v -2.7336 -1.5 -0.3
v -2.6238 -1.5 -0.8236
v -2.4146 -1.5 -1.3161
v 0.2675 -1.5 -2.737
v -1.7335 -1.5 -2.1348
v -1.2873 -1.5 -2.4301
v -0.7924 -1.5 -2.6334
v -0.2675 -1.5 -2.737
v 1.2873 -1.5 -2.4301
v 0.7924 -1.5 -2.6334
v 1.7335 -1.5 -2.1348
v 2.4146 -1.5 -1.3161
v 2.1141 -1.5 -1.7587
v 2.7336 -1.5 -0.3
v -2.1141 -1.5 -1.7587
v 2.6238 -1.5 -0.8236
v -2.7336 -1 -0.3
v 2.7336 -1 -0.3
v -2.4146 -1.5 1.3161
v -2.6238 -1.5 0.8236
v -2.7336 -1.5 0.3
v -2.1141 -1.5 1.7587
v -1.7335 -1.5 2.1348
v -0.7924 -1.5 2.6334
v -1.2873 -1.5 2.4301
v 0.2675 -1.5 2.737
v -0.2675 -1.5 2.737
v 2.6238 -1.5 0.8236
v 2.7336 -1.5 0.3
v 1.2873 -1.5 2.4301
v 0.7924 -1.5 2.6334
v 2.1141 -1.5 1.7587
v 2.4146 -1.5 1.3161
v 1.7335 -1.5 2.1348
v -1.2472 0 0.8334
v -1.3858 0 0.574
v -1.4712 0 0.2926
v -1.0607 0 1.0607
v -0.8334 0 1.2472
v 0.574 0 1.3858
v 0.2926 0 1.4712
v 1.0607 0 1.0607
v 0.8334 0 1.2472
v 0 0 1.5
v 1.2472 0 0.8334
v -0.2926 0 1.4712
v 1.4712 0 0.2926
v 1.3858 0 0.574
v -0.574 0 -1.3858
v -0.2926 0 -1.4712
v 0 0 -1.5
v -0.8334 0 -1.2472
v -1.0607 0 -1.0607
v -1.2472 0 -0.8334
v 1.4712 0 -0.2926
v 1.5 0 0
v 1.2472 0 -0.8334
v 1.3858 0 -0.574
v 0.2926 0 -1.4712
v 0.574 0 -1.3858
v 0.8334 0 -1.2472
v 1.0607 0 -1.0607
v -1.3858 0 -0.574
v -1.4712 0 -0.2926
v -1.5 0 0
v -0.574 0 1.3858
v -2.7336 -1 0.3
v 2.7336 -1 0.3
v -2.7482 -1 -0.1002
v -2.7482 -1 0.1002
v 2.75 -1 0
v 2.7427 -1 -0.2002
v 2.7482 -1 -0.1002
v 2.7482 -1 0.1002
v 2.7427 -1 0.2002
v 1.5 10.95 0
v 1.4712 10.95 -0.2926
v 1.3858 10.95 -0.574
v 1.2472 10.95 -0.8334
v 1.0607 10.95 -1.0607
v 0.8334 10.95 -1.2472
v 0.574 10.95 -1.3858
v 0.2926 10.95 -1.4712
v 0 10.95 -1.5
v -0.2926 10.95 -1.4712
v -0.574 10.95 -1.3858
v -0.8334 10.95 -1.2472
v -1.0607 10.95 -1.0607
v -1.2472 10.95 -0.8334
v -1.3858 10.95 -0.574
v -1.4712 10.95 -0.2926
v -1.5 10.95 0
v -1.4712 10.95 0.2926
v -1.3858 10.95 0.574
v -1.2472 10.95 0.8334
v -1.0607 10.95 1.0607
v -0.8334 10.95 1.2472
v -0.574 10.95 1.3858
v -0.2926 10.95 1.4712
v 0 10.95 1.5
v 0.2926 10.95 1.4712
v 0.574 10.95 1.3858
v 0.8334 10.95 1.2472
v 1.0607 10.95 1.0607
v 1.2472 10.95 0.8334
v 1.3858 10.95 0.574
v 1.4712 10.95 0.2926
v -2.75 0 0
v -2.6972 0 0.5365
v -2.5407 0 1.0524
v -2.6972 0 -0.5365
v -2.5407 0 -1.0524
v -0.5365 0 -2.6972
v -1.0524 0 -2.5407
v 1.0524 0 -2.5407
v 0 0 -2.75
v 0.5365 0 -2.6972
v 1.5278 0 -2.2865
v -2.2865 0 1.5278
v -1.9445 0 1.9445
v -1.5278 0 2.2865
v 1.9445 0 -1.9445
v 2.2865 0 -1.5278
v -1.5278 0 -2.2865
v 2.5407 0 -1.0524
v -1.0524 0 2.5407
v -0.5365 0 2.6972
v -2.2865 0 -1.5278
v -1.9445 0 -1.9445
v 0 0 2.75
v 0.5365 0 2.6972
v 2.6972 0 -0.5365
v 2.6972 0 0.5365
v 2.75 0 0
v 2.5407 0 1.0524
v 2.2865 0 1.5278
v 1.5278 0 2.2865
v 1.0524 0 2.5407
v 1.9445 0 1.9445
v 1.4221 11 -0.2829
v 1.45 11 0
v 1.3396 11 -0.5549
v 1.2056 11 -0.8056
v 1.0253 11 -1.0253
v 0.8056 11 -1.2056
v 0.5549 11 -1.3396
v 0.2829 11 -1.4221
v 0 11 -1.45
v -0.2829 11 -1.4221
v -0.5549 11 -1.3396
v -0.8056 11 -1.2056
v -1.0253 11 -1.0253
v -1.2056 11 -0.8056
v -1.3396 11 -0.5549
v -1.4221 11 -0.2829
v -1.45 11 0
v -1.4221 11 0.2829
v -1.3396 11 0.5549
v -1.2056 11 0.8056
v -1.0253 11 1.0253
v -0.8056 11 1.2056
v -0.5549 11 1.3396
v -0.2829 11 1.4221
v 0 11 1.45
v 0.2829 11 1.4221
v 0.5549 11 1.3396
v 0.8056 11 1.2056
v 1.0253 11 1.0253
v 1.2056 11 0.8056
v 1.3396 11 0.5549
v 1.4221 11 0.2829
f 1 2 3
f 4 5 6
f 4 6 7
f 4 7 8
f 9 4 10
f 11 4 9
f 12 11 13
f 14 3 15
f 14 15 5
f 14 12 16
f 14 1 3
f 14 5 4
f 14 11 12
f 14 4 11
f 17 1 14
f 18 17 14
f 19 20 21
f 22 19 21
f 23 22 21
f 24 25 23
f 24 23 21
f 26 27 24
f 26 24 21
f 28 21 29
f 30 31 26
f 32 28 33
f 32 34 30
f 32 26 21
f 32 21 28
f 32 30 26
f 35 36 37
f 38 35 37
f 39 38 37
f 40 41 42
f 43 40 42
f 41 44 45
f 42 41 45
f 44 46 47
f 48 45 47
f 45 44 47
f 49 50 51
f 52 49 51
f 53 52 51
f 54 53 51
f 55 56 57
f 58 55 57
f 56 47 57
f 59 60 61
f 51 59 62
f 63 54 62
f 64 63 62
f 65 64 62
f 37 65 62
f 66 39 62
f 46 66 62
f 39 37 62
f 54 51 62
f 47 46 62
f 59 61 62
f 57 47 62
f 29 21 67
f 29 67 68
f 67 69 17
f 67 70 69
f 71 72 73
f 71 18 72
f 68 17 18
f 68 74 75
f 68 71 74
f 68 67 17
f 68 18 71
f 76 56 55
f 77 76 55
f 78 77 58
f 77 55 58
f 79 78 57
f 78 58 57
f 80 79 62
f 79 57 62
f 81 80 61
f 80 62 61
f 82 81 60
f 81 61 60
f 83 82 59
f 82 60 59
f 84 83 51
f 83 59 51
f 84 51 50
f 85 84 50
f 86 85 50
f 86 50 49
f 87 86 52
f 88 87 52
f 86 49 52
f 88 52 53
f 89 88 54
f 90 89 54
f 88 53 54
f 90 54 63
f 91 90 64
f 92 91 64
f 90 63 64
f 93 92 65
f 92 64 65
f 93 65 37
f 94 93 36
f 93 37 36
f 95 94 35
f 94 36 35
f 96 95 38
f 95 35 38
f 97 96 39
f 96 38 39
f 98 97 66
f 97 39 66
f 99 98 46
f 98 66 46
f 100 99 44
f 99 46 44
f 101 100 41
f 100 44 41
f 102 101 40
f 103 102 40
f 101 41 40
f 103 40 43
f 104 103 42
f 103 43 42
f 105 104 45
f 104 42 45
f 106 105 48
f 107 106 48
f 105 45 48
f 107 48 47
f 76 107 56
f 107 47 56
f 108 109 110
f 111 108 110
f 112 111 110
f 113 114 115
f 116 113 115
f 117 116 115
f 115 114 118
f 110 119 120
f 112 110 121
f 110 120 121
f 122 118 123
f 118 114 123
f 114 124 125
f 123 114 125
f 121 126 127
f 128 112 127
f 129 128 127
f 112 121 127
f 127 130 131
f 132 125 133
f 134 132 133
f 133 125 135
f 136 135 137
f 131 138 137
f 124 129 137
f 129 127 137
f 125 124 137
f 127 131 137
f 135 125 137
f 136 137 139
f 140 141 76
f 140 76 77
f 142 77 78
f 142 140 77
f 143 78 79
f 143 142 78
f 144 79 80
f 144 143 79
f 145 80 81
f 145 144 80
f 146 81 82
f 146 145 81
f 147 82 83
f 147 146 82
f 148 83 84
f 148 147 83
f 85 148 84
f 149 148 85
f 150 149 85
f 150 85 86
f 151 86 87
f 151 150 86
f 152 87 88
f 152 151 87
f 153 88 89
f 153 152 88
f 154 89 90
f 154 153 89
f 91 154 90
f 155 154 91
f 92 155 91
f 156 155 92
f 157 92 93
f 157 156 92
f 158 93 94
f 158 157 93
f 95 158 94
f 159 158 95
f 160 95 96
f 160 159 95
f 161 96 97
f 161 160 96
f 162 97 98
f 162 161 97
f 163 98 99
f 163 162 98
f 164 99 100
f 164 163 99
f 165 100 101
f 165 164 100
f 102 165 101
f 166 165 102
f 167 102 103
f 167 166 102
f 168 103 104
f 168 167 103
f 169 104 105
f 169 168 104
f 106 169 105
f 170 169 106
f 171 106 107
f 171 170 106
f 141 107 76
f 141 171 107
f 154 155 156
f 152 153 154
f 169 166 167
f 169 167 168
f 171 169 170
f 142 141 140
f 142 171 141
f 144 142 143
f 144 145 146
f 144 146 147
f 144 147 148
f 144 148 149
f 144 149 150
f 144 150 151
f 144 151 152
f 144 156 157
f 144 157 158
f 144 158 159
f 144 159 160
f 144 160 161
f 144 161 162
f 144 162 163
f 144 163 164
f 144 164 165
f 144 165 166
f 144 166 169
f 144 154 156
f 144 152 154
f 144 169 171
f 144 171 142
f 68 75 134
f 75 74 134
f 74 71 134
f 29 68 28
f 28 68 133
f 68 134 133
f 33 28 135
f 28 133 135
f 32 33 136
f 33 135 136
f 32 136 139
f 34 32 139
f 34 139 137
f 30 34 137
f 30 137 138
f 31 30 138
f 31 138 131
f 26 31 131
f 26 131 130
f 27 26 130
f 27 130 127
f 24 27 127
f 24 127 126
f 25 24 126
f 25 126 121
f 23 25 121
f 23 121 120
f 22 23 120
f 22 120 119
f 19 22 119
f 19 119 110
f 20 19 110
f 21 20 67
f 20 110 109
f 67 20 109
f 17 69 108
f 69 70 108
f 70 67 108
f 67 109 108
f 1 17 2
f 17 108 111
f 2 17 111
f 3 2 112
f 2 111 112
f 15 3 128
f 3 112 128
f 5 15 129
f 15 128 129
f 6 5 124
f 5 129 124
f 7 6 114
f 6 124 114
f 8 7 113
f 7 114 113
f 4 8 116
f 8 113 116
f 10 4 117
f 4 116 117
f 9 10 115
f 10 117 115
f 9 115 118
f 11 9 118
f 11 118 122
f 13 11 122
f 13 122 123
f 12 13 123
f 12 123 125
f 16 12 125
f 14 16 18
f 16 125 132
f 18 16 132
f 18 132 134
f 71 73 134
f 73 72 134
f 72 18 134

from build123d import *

# Parameters (mm, degrees)
SKETCH1_R           = 1.5
BOSS_EXTRUDE1_DEPTH = 11
SKETCH2_R           = 2.75
BOSS_EXTRUDE2_DEPTH = 1.5
SKETCH3_W           = 8.196351728
SKETCH3_H           = 0.6
CUT_EXTRUDE1_DEPTH  = 0.5
CHAMFER1_SIZE       = 0.05


with BuildPart() as part:
    # Sketch1 → Boss-Extrude1 (new body)
    with BuildSketch(Plane(origin=(0, 0, 0), x_dir=(1, 0, 0), z_dir=(0, 1, 0))):
        Circle(SKETCH1_R)
    extrude(amount=BOSS_EXTRUDE1_DEPTH)

    # Chamfer1
    chamfer1_edges = [part.edges().sort_by_distance(p)[0] for p in [
        (-1.5, 11, 0),
    ]]
    chamfer(chamfer1_edges, length=CHAMFER1_SIZE)


with BuildPart() as body_2:
    # Sketch2 → Boss-Extrude2 (new body)
    with BuildSketch(Plane.XZ):
        Circle(SKETCH2_R)
    extrude(amount=BOSS_EXTRUDE2_DEPTH)

    # Sketch3 → Cut-Extrude1 (cut)
    with BuildSketch(Plane.XZ.offset(1.5)):
        Rectangle(SKETCH3_W, SKETCH3_H)
    extrude(amount=-CUT_EXTRUDE1_DEPTH, mode=Mode.SUBTRACT)


solid = Compound([part.part, body_2.part])
